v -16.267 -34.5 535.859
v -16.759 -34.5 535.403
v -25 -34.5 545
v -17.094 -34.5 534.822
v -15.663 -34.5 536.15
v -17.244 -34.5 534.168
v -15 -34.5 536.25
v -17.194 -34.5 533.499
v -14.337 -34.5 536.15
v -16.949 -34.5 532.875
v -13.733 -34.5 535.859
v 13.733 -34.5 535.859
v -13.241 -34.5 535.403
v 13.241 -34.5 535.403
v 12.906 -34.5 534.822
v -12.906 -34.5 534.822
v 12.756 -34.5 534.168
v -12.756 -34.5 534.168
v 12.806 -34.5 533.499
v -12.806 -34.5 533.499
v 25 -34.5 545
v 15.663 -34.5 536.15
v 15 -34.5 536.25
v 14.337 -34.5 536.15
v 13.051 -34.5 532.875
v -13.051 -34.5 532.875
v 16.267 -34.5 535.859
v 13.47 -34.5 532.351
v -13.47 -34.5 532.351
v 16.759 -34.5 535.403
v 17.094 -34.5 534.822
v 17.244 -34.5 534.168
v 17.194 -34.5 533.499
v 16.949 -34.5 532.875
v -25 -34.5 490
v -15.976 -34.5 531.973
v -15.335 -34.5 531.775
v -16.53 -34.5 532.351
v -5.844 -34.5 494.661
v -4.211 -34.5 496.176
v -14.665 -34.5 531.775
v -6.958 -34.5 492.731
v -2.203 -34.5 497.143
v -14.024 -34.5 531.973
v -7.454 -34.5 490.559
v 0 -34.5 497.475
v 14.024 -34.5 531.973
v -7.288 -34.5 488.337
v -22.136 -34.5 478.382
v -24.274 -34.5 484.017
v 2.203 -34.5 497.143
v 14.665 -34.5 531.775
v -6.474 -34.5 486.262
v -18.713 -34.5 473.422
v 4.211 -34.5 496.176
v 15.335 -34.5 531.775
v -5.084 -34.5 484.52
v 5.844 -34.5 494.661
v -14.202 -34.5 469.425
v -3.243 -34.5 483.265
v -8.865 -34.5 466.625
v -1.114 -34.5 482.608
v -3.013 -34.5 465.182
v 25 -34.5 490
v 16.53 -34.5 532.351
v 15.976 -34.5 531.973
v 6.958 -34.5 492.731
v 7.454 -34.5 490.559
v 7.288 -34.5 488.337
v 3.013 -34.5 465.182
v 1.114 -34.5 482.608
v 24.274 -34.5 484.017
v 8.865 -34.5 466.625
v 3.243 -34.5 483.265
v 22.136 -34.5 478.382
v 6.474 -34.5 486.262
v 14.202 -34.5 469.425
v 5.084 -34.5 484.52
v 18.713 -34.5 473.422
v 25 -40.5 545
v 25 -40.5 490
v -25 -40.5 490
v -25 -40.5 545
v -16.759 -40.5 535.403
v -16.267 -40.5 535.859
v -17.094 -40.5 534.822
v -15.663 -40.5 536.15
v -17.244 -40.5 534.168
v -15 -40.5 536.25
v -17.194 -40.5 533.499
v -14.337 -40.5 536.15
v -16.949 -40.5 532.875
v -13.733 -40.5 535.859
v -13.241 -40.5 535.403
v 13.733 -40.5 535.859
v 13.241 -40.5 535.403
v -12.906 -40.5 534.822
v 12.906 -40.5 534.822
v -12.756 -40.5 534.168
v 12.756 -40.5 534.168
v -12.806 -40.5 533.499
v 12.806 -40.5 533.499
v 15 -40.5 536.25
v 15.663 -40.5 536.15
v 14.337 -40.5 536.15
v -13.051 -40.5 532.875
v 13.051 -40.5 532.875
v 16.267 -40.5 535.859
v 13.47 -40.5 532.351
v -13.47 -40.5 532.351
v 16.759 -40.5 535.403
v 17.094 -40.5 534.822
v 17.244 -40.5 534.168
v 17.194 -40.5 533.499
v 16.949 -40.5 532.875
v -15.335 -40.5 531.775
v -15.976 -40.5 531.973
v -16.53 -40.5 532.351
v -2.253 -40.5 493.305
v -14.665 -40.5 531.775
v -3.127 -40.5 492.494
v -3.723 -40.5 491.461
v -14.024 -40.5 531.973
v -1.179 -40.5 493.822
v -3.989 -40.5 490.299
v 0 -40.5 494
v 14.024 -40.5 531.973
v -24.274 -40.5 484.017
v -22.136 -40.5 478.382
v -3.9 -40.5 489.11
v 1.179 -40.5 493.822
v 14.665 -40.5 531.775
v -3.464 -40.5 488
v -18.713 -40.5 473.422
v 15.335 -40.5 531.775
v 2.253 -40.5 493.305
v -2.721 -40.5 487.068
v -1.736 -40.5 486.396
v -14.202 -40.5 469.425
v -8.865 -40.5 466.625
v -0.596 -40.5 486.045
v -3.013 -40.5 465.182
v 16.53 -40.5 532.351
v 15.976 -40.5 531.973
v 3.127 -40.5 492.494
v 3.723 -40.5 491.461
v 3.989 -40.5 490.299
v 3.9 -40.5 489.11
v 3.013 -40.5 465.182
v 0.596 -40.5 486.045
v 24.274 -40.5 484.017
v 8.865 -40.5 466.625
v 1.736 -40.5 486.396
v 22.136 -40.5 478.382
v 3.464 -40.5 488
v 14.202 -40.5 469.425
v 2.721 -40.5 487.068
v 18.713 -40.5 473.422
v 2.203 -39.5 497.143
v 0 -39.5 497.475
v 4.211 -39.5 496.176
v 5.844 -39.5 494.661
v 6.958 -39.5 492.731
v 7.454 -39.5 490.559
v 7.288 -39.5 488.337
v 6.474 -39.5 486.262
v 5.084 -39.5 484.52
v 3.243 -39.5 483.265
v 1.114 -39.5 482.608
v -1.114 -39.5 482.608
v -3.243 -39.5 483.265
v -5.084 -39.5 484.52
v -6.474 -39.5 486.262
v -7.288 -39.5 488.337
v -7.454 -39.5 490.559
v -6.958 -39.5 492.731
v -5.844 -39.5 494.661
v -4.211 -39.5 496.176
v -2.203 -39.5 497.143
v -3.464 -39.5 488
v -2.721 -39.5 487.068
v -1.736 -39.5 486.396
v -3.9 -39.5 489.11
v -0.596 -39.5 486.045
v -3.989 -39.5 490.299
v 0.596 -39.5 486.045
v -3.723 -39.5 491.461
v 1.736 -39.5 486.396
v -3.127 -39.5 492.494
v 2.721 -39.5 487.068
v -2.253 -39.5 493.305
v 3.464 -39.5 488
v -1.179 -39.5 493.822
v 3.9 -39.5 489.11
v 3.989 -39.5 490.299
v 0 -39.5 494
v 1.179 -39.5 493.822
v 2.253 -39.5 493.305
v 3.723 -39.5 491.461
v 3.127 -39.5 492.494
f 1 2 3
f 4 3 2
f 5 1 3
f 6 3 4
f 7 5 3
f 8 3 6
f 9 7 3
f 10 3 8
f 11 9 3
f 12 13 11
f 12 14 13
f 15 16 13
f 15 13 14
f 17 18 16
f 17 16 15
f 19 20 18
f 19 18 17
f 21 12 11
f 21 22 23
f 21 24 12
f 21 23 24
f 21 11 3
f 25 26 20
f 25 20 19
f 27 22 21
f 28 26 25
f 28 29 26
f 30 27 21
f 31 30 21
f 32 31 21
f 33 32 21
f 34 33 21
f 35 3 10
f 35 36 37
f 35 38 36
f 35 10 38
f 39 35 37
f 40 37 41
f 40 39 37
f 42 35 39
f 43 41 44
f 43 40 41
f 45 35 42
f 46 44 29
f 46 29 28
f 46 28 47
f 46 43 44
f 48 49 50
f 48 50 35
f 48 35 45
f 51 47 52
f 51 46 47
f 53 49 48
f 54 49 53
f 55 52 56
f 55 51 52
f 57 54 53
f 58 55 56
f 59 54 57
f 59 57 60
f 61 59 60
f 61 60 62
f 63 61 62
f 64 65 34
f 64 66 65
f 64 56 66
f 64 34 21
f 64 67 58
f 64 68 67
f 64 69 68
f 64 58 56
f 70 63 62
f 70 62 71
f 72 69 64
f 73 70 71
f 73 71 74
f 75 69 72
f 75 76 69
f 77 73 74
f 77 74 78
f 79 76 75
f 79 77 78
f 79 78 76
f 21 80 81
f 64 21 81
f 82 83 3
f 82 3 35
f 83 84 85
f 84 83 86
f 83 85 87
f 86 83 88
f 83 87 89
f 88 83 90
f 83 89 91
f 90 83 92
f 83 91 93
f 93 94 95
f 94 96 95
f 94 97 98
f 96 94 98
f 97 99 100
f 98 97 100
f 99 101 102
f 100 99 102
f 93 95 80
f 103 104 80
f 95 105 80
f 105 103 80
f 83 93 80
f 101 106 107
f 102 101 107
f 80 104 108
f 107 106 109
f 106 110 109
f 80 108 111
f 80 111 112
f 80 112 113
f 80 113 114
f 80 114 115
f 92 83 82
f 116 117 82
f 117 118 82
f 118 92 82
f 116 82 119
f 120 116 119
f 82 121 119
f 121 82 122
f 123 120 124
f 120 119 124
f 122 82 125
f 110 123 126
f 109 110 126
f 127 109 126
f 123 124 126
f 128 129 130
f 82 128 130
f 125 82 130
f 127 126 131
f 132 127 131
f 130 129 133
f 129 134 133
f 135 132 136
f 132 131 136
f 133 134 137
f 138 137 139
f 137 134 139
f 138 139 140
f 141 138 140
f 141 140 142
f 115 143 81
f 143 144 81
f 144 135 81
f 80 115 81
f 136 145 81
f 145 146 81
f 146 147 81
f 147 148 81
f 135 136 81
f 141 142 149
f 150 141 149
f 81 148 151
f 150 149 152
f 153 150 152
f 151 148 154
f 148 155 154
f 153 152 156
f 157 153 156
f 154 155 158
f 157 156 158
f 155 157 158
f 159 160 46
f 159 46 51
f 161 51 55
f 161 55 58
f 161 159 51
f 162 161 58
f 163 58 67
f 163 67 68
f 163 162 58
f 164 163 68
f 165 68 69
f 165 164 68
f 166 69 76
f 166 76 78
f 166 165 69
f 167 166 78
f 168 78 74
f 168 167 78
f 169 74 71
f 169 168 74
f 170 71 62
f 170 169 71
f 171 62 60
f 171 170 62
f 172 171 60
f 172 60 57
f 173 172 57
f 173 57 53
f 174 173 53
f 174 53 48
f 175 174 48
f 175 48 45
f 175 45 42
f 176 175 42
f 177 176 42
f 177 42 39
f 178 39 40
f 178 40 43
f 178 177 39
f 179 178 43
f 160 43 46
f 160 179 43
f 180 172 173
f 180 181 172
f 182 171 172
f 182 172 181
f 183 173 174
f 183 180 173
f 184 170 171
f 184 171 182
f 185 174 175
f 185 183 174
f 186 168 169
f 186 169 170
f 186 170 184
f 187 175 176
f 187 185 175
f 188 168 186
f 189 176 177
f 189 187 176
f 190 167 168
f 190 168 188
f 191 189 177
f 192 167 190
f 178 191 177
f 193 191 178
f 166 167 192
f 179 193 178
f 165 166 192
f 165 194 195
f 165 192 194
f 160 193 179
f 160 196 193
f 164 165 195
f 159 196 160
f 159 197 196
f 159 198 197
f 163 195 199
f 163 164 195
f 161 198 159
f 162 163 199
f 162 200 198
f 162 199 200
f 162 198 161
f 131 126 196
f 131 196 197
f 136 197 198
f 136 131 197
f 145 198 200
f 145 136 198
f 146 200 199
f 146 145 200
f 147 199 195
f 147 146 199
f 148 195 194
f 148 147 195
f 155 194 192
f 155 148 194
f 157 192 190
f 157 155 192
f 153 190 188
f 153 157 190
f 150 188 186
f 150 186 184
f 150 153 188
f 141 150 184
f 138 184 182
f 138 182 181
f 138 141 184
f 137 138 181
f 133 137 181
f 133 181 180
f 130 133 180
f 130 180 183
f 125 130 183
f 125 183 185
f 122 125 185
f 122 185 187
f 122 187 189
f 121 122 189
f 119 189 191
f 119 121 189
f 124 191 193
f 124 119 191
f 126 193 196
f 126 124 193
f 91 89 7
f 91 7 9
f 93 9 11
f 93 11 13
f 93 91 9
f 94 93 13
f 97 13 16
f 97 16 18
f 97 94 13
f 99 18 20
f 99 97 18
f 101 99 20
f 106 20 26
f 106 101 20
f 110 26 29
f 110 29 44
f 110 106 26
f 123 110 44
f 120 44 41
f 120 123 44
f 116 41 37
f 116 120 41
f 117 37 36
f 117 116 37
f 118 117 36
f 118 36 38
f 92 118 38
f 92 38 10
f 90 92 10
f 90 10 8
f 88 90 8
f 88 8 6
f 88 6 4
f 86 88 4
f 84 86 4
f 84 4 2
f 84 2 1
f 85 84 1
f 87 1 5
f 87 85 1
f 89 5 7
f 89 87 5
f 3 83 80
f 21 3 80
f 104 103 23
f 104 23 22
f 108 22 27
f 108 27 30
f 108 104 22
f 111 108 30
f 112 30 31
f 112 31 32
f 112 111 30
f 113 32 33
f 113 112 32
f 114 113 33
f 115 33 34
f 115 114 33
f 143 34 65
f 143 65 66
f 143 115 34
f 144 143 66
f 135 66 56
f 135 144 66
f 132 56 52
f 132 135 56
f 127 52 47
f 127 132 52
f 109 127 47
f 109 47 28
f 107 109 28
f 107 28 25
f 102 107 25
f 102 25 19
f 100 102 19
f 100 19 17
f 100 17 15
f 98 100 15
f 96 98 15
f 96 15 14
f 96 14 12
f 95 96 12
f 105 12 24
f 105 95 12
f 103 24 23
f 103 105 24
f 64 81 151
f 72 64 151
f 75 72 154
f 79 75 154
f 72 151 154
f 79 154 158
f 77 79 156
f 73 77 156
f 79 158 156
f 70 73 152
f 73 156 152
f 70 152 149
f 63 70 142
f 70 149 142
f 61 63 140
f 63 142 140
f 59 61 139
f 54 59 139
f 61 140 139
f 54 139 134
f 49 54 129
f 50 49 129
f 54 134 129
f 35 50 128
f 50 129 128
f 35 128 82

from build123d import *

# Parameters (mm, degrees)
PLACA_START              = -40.5
SK_PLACA_W               = 50
SK_PLACA_H               = 36
PLACA_DEPTH              = 6
EXTREMO_START            = -40.5
SK_EXTREMO_R             = 25
EXTREMO_DEPTH            = 6
ALOJAMIENTO_696ZZ_START  = -39.5
SK_ALOJAMIENTO_696ZZ_R   = 7.475
ALOJAMIENTO_696ZZ_DEPTH  = 5
PASO_EXTRACTOR_START     = -40.5
SK_PASO_EXTRACTOR_R      = 4
PASO_EXTRACTOR_DEPTH     = 1
EXTENSION_PESTANAS_START = -40.5
SK_EXTENSION_PESTANAS_W  = 50
SK_EXTENSION_PESTANAS_H  = 19
EXTENSION_PESTANAS_DEPTH = 6
PASANTES_M4_REPISA_START = -40.5
SK_PASANTES_M4_REPISA_R  = 2.25
PASANTES_M4_REPISA_DEPTH = 6


with BuildPart() as part:
    # Sk_Placa → Placa (new body)
    with BuildSketch(Plane(origin=(0, 0, 0), x_dir=(1, 0, 0), z_dir=(0, 1, 0)).offset(PLACA_START)):
        with Locations((0, -508)):
            Rectangle(SK_PLACA_W, SK_PLACA_H)
    extrude(amount=PLACA_DEPTH)

    # Sk_Extremo → Extremo (add)
    with BuildSketch(Plane(origin=(0, 0, 0), x_dir=(1, 0, 0), z_dir=(0, 1, 0)).offset(EXTREMO_START)):
        with Locations((0, -490)):
            Circle(SK_EXTREMO_R)
    extrude(amount=EXTREMO_DEPTH)

    # Sk_Alojamiento_696ZZ → Alojamiento_696ZZ (cut)
    with BuildSketch(Plane(origin=(0, 0, 0), x_dir=(1, 0, 0), z_dir=(0, 1, 0)).offset(ALOJAMIENTO_696ZZ_START)):
        with Locations(Location((0, -490, 0), (0, 0, 270))):
            Circle(SK_ALOJAMIENTO_696ZZ_R)
    extrude(amount=ALOJAMIENTO_696ZZ_DEPTH, mode=Mode.SUBTRACT)

    # Sk_Paso_extractor → Paso_extractor (cut)
    with BuildSketch(Plane(origin=(0, 0, 0), x_dir=(1, 0, 0), z_dir=(0, 1, 0)).offset(PASO_EXTRACTOR_START)):
        with Locations(Location((0, -490, 0), (0, 0, 270))):
            Circle(SK_PASO_EXTRACTOR_R)
    extrude(amount=PASO_EXTRACTOR_DEPTH, mode=Mode.SUBTRACT)

    # Sk_Extension_pestanas → Extension_pestanas (add)
    with BuildSketch(Plane(origin=(0, 0, 0), x_dir=(1, 0, 0), z_dir=(0, 1, 0)).offset(EXTENSION_PESTANAS_START)):
        with Locations((0, -535.5)):
            Rectangle(SK_EXTENSION_PESTANAS_W, SK_EXTENSION_PESTANAS_H)
    extrude(amount=EXTENSION_PESTANAS_DEPTH)

    # Sk_Pasantes_M4_repisa → Pasantes_M4_repisa (cut)
    with BuildSketch(Plane(origin=(0, 0, 0), x_dir=(1, 0, 0), z_dir=(0, 1, 0)).offset(PASANTES_M4_REPISA_START)):
        with Locations(Location((-15, -534, 0), (0, 0, 270))):
            Circle(SK_PASANTES_M4_REPISA_R)
        with Locations(Location((15, -534, 0), (0, 0, 270))):
            Circle(SK_PASANTES_M4_REPISA_R)
    extrude(amount=PASANTES_M4_REPISA_DEPTH, mode=Mode.SUBTRACT)


solid = part.part
